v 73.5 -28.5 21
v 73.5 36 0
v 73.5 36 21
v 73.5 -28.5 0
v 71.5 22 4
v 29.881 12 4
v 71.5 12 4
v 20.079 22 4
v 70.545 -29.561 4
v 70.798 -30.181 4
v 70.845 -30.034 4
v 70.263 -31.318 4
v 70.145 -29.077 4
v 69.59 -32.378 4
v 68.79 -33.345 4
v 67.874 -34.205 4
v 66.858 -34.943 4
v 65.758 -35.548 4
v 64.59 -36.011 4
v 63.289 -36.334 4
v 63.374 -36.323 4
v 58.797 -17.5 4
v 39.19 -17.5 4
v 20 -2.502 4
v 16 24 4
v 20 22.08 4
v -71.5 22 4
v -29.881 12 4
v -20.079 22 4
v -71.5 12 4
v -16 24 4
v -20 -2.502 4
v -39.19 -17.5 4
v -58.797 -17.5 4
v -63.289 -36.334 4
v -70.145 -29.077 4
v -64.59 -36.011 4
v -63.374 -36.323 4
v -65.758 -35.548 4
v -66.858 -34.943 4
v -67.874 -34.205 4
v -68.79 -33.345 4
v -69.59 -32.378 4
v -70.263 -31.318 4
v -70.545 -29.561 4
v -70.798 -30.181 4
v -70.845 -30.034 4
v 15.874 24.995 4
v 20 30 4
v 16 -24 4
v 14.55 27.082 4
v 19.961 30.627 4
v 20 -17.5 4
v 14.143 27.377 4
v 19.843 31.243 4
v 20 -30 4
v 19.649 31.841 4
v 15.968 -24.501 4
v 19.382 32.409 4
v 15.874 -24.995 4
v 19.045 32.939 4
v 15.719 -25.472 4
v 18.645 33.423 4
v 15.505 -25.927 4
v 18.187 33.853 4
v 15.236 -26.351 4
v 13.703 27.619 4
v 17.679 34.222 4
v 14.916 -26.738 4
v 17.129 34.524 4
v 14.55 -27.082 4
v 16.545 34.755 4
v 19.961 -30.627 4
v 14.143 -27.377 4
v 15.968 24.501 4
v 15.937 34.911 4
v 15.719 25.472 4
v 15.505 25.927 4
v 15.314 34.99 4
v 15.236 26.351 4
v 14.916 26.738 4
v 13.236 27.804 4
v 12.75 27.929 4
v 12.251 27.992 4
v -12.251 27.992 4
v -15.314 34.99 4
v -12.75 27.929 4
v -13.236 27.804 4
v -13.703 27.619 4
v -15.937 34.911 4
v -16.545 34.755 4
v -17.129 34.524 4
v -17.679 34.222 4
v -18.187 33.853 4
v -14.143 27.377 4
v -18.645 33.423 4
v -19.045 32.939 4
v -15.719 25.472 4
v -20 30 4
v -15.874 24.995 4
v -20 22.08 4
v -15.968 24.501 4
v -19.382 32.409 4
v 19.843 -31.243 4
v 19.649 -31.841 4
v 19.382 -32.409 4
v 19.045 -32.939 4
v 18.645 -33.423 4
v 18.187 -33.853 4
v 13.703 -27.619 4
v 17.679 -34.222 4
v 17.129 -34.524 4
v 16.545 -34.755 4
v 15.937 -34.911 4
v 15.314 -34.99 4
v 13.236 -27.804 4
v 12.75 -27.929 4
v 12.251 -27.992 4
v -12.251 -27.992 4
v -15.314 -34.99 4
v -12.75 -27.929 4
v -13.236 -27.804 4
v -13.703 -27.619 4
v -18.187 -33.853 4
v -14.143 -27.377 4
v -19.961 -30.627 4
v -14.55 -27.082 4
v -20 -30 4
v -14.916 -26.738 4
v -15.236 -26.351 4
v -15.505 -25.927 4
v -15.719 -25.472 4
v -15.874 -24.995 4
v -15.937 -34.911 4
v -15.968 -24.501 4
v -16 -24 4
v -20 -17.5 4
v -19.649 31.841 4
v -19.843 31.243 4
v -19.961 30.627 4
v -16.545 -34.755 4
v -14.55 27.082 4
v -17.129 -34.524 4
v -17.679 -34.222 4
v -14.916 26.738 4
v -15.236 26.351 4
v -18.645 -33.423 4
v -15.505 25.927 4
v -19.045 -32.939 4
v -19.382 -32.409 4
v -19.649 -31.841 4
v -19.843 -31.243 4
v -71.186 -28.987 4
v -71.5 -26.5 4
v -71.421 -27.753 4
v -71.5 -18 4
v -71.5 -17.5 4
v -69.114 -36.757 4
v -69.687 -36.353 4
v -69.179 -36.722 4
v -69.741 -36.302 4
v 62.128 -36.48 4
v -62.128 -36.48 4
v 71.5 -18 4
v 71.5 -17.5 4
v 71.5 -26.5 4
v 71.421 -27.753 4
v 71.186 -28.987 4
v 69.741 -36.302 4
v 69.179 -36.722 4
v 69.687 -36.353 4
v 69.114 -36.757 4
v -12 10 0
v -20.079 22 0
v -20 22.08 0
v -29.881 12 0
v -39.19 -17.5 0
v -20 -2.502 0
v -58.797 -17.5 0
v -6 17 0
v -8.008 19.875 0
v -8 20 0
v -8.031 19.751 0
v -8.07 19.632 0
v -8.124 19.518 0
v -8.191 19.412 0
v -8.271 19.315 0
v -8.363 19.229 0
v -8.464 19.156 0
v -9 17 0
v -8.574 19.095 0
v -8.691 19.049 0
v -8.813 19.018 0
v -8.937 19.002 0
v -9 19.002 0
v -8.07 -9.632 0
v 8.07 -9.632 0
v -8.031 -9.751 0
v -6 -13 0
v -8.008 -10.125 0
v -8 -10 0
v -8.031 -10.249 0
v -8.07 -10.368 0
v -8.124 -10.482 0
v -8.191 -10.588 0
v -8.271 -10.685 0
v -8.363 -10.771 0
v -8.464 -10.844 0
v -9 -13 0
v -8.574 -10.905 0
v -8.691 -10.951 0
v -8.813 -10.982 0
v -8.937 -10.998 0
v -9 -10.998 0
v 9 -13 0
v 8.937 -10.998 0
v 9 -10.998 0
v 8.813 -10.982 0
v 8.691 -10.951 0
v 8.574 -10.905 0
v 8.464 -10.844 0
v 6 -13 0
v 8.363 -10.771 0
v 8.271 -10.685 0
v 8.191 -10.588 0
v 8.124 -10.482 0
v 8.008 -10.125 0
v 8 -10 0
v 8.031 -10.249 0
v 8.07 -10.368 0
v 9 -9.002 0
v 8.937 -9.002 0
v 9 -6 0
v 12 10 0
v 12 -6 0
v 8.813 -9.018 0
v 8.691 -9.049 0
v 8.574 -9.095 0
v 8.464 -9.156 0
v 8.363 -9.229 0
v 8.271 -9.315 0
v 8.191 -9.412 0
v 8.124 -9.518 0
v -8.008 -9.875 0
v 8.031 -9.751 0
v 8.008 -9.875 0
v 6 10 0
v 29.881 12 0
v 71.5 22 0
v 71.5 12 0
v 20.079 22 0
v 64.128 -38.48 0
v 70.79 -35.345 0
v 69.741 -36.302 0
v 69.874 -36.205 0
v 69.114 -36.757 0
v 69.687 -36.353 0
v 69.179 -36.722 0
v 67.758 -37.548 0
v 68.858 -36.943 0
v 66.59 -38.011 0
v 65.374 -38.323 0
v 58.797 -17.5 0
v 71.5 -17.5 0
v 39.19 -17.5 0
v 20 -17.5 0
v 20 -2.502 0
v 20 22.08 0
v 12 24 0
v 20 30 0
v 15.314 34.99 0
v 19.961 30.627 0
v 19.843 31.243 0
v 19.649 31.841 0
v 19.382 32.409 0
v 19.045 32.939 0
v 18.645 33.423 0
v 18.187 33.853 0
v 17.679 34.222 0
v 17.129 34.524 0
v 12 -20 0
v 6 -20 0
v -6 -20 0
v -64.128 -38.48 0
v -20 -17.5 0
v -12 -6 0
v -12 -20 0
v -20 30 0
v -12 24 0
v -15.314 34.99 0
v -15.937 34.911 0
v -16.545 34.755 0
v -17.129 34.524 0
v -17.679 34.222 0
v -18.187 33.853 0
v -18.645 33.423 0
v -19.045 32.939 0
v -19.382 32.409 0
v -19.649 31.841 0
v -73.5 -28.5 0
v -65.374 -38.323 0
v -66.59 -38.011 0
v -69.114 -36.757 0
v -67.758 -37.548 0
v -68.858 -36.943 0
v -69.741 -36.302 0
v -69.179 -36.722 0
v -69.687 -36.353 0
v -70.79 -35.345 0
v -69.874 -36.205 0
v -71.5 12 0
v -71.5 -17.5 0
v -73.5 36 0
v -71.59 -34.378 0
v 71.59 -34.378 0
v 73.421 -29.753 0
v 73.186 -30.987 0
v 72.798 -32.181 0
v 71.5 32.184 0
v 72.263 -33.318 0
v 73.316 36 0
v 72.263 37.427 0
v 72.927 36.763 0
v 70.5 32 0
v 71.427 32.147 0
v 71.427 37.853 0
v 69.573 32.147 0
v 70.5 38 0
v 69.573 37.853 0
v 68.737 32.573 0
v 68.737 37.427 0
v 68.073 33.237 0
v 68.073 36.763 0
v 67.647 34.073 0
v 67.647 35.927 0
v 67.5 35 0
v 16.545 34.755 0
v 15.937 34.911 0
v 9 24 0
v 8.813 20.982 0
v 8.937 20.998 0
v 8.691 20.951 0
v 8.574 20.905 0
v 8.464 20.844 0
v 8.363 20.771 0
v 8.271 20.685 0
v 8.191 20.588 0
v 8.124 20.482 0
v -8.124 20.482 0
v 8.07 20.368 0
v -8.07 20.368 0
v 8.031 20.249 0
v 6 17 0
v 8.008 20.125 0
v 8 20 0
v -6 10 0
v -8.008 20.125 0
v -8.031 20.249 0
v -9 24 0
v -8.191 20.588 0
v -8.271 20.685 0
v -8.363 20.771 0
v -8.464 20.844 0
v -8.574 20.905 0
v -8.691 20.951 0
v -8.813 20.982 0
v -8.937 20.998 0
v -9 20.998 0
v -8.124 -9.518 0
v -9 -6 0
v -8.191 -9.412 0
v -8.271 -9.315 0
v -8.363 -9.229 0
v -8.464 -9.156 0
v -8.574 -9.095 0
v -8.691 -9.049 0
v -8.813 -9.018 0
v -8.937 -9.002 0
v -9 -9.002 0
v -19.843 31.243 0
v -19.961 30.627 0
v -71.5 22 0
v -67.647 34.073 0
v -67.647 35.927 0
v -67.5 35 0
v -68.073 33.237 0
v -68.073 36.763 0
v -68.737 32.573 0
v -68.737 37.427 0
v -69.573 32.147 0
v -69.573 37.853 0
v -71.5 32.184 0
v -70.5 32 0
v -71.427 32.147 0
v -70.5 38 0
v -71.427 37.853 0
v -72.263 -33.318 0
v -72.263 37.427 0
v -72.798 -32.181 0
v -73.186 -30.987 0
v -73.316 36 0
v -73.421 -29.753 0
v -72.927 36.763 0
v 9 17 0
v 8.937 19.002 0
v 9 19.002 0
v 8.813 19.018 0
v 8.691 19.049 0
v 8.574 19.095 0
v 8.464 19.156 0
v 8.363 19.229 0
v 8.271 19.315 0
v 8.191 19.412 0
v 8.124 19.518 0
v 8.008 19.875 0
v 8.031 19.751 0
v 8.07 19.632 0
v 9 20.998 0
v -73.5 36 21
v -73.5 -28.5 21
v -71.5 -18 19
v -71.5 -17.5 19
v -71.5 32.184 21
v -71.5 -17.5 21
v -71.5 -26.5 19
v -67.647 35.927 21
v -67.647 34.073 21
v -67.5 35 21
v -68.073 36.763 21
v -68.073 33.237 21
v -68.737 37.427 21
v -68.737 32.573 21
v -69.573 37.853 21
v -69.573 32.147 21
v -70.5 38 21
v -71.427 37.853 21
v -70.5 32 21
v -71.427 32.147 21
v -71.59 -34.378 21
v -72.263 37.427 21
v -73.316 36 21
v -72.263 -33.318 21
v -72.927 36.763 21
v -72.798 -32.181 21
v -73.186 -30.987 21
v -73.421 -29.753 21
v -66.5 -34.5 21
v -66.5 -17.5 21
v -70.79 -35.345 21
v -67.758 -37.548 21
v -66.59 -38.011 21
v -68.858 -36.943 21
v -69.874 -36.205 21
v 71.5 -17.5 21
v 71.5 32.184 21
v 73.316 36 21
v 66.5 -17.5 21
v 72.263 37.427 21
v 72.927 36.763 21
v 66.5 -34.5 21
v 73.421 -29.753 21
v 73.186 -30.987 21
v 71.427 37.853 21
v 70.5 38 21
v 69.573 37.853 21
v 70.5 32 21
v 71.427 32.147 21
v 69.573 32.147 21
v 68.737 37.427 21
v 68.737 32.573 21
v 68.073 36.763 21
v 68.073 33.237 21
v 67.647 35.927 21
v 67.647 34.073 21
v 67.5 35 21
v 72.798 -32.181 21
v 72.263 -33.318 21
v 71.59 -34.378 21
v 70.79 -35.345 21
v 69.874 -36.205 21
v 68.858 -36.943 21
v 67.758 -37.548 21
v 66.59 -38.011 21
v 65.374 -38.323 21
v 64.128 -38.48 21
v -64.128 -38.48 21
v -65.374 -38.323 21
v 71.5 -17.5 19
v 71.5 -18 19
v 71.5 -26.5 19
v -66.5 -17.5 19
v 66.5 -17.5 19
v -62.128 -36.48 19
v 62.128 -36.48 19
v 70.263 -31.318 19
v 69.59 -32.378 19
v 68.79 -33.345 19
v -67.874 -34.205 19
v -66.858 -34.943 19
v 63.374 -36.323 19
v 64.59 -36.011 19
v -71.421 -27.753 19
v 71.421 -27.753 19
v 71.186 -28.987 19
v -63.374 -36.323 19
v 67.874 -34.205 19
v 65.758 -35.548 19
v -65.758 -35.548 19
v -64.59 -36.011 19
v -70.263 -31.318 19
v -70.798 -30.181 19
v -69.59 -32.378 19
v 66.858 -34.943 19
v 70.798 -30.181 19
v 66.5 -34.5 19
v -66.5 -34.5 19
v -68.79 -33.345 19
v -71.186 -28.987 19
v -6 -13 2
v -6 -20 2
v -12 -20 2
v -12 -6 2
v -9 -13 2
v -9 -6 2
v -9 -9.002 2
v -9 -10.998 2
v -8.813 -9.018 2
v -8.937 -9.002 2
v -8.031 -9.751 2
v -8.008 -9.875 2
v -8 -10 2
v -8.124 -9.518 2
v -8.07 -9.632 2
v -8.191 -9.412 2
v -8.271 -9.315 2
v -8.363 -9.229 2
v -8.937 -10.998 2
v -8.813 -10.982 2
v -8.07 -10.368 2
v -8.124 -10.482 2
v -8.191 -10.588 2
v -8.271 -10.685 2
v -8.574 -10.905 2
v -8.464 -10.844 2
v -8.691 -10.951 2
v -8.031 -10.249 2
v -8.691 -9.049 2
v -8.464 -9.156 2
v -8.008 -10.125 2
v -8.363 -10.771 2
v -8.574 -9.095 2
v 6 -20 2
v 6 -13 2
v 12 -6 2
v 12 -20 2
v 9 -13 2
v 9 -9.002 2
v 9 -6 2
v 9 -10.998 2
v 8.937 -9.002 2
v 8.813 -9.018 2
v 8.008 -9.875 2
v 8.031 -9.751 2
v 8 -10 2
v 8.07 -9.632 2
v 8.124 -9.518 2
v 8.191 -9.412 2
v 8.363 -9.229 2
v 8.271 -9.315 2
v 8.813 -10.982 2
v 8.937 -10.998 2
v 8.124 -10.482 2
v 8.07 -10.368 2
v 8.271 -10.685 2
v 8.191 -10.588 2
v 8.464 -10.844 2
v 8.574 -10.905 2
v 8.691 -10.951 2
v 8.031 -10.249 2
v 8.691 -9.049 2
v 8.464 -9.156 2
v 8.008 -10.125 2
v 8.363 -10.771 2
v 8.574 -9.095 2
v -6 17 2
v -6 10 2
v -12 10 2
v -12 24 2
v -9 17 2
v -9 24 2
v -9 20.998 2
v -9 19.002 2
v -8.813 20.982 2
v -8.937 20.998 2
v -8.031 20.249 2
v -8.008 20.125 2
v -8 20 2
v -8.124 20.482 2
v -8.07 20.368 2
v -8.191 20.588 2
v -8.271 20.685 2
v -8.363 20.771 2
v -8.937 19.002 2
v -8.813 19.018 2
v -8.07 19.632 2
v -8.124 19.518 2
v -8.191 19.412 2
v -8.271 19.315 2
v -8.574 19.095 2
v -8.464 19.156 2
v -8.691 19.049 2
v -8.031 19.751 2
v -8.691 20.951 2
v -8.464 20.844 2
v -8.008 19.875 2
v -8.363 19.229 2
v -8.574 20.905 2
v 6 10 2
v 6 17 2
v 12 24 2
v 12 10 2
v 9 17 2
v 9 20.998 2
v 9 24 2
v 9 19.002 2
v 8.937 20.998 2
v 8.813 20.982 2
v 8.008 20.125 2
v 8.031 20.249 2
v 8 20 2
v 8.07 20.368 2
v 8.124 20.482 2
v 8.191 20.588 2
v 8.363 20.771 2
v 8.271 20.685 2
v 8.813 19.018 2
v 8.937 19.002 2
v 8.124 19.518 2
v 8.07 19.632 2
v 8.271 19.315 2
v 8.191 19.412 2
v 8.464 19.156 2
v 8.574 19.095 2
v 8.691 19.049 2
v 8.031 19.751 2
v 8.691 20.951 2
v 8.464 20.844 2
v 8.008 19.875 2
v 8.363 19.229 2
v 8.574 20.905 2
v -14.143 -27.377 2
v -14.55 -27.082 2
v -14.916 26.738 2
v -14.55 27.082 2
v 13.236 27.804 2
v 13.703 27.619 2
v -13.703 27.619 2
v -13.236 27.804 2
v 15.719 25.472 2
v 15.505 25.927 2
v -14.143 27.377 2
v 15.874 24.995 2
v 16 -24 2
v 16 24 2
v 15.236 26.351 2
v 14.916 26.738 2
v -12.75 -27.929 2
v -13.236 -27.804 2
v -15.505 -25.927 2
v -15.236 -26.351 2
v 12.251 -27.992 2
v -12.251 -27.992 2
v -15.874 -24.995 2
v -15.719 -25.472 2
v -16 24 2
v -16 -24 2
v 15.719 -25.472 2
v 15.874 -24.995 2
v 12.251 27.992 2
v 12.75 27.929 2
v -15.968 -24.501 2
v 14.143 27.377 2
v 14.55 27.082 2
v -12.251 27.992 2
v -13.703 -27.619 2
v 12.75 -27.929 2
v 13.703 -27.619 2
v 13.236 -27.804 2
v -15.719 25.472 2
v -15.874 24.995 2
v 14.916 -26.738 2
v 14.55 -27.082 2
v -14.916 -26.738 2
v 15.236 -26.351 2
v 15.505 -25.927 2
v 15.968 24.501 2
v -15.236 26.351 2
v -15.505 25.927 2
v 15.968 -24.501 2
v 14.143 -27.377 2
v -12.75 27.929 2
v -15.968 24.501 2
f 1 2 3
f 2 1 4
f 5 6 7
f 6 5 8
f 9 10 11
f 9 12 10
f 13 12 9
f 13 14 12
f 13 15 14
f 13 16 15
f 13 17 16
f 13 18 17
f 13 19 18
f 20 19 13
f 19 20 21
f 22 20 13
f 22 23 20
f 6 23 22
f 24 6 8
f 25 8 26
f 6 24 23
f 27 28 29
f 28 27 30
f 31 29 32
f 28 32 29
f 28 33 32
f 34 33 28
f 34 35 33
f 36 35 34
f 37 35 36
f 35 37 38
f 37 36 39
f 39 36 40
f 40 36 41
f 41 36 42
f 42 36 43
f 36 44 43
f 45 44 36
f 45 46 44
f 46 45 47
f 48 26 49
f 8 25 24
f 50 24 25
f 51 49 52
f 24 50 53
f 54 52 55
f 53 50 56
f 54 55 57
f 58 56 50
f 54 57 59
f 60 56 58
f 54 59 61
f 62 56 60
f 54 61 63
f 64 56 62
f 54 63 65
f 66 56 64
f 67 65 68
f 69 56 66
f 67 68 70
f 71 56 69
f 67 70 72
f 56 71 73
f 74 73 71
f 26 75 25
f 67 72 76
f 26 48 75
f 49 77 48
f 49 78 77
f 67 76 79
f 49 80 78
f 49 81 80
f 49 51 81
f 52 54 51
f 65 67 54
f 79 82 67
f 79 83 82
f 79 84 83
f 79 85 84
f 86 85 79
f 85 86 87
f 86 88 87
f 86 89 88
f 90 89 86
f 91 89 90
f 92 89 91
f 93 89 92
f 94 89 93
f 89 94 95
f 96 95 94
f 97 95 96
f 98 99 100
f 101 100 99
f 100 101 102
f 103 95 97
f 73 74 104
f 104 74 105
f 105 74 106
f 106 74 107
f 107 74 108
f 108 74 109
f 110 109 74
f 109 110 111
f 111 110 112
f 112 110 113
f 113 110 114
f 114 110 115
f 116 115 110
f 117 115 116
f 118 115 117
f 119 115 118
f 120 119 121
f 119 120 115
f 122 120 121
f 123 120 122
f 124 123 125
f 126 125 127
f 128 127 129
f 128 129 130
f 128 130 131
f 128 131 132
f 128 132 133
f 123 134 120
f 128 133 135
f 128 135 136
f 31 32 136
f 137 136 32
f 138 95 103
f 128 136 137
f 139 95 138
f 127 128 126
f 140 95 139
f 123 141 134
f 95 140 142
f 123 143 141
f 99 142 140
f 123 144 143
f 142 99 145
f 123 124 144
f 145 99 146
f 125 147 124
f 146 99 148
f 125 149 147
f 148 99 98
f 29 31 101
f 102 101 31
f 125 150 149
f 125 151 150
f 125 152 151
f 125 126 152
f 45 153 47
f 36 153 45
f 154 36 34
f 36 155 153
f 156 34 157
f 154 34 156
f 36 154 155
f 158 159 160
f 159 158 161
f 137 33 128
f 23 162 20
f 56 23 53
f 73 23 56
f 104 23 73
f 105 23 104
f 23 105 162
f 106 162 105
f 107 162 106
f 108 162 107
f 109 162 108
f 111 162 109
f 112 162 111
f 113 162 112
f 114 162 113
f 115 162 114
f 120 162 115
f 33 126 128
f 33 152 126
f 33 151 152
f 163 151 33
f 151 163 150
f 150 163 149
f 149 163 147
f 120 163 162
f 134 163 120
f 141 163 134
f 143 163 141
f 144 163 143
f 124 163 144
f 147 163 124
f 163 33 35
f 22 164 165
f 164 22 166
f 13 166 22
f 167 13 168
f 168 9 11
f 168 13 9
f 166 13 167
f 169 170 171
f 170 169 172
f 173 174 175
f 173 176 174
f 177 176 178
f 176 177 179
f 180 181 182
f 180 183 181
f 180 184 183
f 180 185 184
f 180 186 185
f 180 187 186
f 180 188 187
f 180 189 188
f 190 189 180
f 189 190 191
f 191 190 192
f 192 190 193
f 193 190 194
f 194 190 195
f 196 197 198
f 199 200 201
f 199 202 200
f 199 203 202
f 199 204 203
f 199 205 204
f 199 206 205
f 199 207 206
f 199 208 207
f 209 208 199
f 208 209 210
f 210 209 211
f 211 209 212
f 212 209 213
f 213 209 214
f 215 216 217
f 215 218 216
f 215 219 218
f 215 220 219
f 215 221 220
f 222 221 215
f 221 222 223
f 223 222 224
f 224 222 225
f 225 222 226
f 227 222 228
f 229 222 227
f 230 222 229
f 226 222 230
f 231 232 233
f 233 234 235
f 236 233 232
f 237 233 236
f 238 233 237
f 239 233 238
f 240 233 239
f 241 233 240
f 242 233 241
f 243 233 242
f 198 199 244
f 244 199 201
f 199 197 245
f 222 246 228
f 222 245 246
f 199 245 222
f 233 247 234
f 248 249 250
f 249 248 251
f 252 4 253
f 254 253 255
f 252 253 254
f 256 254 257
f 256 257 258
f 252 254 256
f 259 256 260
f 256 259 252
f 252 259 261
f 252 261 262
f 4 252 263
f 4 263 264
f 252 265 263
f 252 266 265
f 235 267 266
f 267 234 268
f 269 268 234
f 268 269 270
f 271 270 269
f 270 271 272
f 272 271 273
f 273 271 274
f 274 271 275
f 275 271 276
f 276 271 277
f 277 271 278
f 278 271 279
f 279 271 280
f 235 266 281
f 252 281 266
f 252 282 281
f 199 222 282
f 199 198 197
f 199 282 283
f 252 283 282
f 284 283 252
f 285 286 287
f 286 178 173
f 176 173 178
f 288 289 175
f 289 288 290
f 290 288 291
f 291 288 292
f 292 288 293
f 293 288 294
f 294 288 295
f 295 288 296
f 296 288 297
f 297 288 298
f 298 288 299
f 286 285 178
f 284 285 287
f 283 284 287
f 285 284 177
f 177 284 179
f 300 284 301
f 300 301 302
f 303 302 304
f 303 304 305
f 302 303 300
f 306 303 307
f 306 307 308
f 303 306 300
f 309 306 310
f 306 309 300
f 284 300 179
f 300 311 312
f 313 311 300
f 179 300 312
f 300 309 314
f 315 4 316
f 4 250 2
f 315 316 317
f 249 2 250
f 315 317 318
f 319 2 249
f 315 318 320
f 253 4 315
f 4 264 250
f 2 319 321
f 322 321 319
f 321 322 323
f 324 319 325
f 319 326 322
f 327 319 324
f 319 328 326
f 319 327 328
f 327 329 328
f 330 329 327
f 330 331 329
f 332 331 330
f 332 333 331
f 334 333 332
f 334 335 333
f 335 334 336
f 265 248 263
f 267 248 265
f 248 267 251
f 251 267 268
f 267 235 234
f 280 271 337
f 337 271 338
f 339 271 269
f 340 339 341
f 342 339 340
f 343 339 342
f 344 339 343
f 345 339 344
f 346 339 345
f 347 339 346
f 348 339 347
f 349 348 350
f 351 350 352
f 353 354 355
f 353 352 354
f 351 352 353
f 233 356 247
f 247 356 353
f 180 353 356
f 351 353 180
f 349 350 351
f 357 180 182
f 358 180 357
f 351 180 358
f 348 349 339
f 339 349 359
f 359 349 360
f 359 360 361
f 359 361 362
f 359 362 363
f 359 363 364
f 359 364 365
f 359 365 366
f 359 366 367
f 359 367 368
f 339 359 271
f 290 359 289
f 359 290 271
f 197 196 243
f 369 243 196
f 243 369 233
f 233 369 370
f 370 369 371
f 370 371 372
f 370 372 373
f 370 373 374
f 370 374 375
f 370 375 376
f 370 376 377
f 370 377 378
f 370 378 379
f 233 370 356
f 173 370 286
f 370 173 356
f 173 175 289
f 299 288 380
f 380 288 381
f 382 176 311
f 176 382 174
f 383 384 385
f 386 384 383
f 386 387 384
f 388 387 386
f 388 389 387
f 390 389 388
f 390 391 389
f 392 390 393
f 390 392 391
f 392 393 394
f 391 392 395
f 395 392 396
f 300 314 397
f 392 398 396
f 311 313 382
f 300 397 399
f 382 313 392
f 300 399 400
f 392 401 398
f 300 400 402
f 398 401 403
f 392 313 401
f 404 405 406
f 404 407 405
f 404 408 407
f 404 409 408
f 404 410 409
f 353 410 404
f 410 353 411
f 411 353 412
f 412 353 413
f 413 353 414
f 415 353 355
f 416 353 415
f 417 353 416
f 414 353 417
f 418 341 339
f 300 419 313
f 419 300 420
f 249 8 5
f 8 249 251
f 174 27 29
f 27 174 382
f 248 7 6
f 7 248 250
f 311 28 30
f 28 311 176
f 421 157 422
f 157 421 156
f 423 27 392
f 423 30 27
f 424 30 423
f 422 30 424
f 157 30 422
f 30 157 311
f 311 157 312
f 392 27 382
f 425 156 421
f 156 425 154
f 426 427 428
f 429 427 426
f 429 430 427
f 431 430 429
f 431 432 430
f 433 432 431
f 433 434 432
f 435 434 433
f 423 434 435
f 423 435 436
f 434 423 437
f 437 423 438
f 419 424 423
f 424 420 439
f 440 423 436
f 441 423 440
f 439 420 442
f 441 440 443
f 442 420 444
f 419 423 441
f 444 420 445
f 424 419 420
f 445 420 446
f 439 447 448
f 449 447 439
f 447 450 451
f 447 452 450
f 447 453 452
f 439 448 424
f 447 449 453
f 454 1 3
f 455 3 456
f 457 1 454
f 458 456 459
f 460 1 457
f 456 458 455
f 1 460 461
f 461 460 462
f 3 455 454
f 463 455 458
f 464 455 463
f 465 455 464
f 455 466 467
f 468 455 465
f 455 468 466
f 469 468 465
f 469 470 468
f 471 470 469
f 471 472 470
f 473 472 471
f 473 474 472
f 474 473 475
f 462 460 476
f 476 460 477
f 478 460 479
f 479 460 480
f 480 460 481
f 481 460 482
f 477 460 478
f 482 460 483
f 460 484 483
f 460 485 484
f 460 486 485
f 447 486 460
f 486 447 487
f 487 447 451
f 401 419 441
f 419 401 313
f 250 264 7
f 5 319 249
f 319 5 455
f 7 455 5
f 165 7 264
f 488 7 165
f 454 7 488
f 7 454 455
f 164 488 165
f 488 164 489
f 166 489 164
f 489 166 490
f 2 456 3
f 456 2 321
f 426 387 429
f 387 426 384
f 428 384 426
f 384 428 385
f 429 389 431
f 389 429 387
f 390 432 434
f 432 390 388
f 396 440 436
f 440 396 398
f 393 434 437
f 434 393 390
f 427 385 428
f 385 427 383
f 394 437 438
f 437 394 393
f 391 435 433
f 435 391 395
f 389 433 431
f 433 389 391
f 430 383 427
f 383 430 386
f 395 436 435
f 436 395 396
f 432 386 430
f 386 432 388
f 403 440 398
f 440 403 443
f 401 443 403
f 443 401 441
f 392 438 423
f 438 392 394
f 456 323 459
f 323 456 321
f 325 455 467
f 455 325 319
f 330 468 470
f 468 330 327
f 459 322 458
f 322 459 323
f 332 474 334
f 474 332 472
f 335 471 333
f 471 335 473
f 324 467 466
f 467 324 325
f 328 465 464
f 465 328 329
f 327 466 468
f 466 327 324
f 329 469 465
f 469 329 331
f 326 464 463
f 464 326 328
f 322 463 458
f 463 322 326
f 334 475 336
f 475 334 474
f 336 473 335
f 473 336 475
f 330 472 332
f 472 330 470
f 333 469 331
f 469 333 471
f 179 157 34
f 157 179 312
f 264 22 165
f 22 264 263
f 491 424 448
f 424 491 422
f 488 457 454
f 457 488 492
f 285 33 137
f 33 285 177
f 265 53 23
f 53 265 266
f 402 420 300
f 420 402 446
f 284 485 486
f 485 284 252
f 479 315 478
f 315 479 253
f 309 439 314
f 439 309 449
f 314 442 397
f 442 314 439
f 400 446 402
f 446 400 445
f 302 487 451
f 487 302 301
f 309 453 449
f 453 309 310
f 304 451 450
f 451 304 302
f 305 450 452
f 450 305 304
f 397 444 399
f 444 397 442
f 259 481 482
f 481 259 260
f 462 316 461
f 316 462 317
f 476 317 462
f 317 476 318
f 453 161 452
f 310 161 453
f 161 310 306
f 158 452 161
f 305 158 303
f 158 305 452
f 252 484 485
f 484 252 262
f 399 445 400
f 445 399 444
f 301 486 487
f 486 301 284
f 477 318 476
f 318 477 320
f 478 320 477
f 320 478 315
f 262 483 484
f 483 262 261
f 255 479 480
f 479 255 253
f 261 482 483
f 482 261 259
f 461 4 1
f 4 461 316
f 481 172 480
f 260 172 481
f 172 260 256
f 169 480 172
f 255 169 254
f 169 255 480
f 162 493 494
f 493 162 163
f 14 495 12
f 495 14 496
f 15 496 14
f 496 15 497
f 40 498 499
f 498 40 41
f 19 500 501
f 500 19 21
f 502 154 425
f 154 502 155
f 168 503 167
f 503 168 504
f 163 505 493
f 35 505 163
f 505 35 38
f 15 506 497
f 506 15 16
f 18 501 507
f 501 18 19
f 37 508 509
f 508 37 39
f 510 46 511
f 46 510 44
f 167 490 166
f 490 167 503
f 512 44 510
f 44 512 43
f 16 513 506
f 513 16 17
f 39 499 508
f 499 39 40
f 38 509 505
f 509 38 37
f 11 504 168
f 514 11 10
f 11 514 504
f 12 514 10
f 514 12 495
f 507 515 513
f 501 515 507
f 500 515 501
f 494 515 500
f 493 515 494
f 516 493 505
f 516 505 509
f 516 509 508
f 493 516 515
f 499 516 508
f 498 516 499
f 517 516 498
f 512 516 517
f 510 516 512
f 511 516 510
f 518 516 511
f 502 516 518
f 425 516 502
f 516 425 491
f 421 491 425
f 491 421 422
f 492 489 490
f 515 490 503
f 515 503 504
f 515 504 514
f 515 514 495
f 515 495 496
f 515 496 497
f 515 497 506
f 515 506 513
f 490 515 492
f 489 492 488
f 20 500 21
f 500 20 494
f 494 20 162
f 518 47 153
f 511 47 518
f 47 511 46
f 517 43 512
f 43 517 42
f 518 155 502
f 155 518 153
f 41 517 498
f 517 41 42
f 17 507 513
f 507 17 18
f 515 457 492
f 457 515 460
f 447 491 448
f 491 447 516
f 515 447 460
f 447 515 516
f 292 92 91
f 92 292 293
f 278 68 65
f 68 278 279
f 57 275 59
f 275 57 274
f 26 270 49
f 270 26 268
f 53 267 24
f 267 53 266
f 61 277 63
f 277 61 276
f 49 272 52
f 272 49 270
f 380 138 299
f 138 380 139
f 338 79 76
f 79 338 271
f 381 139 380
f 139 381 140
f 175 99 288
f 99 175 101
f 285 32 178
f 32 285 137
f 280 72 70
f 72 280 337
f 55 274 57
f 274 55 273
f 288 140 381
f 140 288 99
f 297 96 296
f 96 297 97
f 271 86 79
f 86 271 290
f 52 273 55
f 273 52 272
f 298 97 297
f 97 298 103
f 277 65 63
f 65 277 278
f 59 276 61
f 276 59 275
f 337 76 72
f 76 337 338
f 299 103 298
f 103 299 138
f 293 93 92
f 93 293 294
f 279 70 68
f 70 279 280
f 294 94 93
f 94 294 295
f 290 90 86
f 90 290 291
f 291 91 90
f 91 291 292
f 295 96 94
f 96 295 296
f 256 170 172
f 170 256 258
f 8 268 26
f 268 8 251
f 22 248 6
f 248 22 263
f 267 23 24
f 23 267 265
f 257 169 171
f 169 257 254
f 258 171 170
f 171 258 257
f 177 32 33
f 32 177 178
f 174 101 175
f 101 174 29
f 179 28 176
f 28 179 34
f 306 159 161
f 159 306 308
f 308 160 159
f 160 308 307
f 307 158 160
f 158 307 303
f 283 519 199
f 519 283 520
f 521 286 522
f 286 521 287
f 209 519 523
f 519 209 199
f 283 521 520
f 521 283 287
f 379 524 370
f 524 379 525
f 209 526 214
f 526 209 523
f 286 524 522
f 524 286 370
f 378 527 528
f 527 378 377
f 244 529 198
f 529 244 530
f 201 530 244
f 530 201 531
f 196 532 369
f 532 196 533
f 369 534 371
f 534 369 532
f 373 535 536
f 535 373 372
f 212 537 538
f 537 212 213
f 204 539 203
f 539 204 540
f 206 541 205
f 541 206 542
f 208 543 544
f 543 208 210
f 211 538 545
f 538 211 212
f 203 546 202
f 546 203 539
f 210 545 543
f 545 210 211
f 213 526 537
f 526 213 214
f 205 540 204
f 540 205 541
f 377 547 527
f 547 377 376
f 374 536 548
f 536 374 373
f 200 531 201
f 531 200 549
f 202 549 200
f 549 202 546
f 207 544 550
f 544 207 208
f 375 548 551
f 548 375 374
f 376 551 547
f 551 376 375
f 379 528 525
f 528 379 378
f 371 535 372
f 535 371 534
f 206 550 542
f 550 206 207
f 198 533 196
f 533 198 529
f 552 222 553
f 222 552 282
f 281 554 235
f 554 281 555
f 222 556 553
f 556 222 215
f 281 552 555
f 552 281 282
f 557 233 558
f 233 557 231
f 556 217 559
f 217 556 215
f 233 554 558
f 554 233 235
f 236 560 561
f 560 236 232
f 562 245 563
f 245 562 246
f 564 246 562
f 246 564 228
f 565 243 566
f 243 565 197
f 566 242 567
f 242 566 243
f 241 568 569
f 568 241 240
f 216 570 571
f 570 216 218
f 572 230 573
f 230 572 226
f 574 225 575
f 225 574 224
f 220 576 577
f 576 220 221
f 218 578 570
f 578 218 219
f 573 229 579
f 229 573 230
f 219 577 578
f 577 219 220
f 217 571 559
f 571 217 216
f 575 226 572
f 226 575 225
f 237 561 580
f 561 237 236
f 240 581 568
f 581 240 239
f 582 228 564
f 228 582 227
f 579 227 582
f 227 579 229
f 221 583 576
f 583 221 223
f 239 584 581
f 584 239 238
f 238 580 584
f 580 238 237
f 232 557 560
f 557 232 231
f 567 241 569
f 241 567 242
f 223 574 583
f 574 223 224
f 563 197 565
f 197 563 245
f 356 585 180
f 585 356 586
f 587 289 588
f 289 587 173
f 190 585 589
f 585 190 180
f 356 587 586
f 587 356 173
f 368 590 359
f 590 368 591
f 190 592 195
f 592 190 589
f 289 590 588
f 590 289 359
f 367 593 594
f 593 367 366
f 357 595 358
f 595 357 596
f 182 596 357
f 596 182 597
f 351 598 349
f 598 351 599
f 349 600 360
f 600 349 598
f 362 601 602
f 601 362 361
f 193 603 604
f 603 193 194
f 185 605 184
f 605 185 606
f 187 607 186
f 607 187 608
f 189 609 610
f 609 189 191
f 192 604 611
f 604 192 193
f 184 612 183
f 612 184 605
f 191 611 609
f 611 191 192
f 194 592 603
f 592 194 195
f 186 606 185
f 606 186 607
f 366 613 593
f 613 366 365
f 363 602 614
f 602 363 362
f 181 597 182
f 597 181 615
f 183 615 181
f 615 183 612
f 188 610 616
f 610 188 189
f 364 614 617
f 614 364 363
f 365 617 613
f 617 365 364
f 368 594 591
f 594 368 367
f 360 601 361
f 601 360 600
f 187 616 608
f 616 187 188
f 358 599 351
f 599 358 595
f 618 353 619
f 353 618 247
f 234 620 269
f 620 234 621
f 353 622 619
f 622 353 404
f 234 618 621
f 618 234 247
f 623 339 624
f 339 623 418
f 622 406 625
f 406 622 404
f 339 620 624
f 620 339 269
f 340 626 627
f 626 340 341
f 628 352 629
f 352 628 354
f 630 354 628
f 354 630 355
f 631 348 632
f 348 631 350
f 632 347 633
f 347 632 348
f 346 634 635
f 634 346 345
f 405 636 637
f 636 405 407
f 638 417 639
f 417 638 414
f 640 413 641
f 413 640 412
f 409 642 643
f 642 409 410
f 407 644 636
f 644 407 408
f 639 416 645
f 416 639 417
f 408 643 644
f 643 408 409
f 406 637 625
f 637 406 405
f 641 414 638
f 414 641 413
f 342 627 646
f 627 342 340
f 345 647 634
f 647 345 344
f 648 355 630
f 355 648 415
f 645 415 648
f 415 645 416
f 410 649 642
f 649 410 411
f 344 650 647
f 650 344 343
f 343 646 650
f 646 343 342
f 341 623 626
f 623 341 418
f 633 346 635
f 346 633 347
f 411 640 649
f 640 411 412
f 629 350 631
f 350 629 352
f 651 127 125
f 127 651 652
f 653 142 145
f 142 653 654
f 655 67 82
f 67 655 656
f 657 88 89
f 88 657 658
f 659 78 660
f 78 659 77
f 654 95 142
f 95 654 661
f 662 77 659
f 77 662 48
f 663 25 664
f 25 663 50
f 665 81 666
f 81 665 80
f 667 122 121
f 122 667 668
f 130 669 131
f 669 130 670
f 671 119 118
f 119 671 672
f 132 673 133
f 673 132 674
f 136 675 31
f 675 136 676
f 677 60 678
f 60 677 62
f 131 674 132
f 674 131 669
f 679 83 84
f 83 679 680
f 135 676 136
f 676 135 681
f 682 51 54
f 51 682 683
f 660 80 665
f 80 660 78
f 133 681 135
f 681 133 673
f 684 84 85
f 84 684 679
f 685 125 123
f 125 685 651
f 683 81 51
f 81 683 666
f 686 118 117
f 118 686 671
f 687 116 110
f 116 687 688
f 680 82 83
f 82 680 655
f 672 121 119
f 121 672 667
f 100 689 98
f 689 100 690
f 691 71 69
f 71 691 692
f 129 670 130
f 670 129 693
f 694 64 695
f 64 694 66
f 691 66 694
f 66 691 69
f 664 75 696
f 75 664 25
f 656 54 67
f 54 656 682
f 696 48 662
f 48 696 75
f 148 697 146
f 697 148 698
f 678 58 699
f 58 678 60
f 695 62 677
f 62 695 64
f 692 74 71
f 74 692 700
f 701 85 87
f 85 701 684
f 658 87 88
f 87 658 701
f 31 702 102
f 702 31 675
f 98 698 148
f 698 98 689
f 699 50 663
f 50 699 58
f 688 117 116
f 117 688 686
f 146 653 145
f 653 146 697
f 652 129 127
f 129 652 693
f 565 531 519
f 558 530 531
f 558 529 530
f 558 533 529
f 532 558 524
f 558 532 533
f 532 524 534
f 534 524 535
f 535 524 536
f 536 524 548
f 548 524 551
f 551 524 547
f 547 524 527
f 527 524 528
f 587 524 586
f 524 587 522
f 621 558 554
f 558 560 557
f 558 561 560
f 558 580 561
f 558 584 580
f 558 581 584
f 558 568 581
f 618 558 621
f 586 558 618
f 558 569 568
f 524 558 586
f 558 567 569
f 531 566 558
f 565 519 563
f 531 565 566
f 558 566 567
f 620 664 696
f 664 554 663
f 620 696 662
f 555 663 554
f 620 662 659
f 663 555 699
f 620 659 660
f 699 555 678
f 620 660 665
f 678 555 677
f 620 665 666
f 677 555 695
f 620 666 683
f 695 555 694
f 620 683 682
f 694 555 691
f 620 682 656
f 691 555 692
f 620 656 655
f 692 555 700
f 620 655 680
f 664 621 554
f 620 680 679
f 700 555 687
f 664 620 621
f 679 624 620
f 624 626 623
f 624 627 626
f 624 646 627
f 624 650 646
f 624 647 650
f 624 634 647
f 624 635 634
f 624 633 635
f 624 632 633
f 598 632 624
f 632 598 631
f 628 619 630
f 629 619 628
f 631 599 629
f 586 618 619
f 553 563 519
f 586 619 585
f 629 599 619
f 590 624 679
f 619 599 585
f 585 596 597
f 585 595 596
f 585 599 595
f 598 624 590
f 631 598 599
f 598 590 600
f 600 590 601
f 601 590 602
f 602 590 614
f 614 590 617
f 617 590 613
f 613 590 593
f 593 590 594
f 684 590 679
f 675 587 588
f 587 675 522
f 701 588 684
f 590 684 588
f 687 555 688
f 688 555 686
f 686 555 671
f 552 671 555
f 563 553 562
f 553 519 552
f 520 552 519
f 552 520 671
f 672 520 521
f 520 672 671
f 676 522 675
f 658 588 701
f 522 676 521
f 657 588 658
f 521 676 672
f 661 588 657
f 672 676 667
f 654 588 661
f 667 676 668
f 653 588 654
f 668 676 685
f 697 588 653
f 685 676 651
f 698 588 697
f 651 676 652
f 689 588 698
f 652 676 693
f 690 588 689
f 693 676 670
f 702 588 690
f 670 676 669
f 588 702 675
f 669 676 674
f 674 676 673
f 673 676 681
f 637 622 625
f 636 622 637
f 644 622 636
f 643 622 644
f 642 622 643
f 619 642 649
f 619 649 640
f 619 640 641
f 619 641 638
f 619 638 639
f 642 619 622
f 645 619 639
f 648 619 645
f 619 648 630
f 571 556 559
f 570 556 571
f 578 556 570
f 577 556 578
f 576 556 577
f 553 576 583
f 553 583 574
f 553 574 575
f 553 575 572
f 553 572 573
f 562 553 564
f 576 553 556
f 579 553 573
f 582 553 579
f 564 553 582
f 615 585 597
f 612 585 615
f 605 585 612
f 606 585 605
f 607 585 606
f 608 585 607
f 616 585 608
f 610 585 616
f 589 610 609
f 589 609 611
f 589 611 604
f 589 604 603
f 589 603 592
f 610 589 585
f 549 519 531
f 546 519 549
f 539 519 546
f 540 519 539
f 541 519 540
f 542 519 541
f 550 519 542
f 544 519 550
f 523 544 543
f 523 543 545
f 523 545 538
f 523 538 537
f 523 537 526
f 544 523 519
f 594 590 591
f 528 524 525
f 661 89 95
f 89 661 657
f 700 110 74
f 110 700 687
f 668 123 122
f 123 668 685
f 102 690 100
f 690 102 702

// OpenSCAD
phone_width = 143;
phone_length = 73;
phone_height = 15;
radius_phone = 10;

/* [Hidden] */
height = 4;
radius = 5;

$fn=50;

//#phone();

difference() {
    union() {
        difference() {
            base_plate();
        }
        lower_connector();
        mirror([1,0,0]) lower_connector();
        // No upper connector
        //upper_connector();
        middle_part();
        lower_part();
        // No upper part
        //upper_part();
    }
    translate([0,0,height-2]) scale([0.8,0.8,1]) base_plate(); 
    mount_grid();
}

module phone() {    
    color("blue", 0.2) hull() {
        translate([phone_width/2-radius_phone, phone_length/2-radius_phone, height]) cylinder(r=radius_phone,h=phone_height);
        translate([phone_width/2-radius_phone, -phone_length/2+radius_phone, height]) cylinder(r=radius_phone,h=phone_height);
        translate([-phone_width/2+radius_phone, phone_length/2-radius_phone, height]) cylinder(r=radius_phone,h=phone_height);
        translate([-phone_width/2+radius_phone, -phone_length/2+radius_phone, height]) cylinder(r=radius_phone,h=phone_height);
    }
}

module base_plate() {
    hull() {
        translate([15, 30, 0]) cylinder(r=radius,h=height);
        translate([15, -30, 0]) cylinder(r=radius,h=height);
        translate([-15, 30, 0]) cylinder(r=radius,h=height);
        translate([-15, -30, 0]) cylinder(r=radius,h=height);
    }
}

module upper_connector() {
    hull() {
        translate([0, 20, height/2]) cube([4*radius, 4*radius, height], center = true);
        translate([0, phone_length/2, height/2]) cube([2*radius, 2*radius, height], center = true);
    }
}

module upper_part() {
    translate([0, phone_length/2+radius, 1]) rotate([0,90,0]) {
        hull() {
            cylinder(r=1,h=2*radius, center=true);
            translate([-phone_height+2, 0, 0]) cylinder(r=0.5,h=2*radius, center=true);
        }        
        translate([-phone_height-4, 0, 0]) difference() {
            cylinder(r=6, h=2*radius, center=true);
            cylinder(r=5, h=2*radius, center=true);
            translate([-10,0.5,-10]) cube([20, 10, 20]);
            translate([-15,-12,-10]) rotate([0,0,45]) cube([20, 10, 20]);
        }
        #translate([-phone_height-12,-5.5,-radius]) rotate([0,0,45])  cube([radius, 1, 2*radius]);
    }
}

module lower_connector() {
    hull() {
        translate([10, 18, 0]) cylinder(r=2*radius,h=height);
        translate([phone_width/2-5, -phone_length/2+4, 0]) cylinder(r=radius,h=height);
    }
    // No rotation of lower part
    //translate([phone_width/2-10, -phone_length/2+4, 0]) cylinder(r=radius,h=7);
}

module lower_part() {
    // No rotation of lower part
    rotate([/*-5*/0,0,0]) difference() {
        hull() {
            translate([0, -phone_length/2+18, (phone_height + 2+height)/2]) cube([phone_width + 4, 2, phone_height + 2+height], center=true);
            translate([-phone_width/2+radius+3, -phone_length/2+radius_phone - 2, 0]) cylinder(r=radius_phone,h=phone_height + 2+height);
            translate([phone_width/2-radius-3, -phone_length/2+radius_phone - 2, 0]) cylinder(r=radius_phone,h=phone_height + 2+height);
        }
        phone();
        // cut out for display
        //translate([0,10,20]) cube([phone_width, phone_length, phone_height], center=true);
        // cut out for microphone
        translate([0,2,20]) cube([phone_width-10, phone_length, phone_height], center=true);
        // cut out for charger
        //translate([0,-12,16]) cube([15, phone_length, phone_height], center=true);
    }
}

module middle_part() {
    translate([0,17,height/2]) {
        cube([phone_width+4, 10, height], center = true);
        translate([-phone_width/2-2,-35,-height/2]) cube([2, 54, phone_height + 2+height]);
        translate([phone_width/2,-35,-height/2]) cube([2, 54, phone_height + 2+height]);

        translate([-phone_width/2+1,18,-height/2]) cylinder(r=3, h=phone_height+2+height, $fn=20);
        translate([+phone_width/2-1,18,-height/2]) cylinder(r=3, h=phone_height+2+height, $fn=20);
    }
}

module mount_grid() {
    translate([-10.5, -20, 0]) mount_grid_module();
    translate([10.5, -20, 0]) mirror([180,0,0]) mount_grid_module();
    translate([-10.5, 10, 0]) mount_grid_module();
    translate([10.5, 10, 0]) mirror([180,0,0]) mount_grid_module();
}

module mount_grid_module() {    
    translate([-1.5, 0, -10]) cube([6, 7, 20]);
    translate([-1.5, 7, -10]) cube([3, 7, 20]);
    translate([1.5, 10, -10]) cylinder(r=1,h=20);
}
